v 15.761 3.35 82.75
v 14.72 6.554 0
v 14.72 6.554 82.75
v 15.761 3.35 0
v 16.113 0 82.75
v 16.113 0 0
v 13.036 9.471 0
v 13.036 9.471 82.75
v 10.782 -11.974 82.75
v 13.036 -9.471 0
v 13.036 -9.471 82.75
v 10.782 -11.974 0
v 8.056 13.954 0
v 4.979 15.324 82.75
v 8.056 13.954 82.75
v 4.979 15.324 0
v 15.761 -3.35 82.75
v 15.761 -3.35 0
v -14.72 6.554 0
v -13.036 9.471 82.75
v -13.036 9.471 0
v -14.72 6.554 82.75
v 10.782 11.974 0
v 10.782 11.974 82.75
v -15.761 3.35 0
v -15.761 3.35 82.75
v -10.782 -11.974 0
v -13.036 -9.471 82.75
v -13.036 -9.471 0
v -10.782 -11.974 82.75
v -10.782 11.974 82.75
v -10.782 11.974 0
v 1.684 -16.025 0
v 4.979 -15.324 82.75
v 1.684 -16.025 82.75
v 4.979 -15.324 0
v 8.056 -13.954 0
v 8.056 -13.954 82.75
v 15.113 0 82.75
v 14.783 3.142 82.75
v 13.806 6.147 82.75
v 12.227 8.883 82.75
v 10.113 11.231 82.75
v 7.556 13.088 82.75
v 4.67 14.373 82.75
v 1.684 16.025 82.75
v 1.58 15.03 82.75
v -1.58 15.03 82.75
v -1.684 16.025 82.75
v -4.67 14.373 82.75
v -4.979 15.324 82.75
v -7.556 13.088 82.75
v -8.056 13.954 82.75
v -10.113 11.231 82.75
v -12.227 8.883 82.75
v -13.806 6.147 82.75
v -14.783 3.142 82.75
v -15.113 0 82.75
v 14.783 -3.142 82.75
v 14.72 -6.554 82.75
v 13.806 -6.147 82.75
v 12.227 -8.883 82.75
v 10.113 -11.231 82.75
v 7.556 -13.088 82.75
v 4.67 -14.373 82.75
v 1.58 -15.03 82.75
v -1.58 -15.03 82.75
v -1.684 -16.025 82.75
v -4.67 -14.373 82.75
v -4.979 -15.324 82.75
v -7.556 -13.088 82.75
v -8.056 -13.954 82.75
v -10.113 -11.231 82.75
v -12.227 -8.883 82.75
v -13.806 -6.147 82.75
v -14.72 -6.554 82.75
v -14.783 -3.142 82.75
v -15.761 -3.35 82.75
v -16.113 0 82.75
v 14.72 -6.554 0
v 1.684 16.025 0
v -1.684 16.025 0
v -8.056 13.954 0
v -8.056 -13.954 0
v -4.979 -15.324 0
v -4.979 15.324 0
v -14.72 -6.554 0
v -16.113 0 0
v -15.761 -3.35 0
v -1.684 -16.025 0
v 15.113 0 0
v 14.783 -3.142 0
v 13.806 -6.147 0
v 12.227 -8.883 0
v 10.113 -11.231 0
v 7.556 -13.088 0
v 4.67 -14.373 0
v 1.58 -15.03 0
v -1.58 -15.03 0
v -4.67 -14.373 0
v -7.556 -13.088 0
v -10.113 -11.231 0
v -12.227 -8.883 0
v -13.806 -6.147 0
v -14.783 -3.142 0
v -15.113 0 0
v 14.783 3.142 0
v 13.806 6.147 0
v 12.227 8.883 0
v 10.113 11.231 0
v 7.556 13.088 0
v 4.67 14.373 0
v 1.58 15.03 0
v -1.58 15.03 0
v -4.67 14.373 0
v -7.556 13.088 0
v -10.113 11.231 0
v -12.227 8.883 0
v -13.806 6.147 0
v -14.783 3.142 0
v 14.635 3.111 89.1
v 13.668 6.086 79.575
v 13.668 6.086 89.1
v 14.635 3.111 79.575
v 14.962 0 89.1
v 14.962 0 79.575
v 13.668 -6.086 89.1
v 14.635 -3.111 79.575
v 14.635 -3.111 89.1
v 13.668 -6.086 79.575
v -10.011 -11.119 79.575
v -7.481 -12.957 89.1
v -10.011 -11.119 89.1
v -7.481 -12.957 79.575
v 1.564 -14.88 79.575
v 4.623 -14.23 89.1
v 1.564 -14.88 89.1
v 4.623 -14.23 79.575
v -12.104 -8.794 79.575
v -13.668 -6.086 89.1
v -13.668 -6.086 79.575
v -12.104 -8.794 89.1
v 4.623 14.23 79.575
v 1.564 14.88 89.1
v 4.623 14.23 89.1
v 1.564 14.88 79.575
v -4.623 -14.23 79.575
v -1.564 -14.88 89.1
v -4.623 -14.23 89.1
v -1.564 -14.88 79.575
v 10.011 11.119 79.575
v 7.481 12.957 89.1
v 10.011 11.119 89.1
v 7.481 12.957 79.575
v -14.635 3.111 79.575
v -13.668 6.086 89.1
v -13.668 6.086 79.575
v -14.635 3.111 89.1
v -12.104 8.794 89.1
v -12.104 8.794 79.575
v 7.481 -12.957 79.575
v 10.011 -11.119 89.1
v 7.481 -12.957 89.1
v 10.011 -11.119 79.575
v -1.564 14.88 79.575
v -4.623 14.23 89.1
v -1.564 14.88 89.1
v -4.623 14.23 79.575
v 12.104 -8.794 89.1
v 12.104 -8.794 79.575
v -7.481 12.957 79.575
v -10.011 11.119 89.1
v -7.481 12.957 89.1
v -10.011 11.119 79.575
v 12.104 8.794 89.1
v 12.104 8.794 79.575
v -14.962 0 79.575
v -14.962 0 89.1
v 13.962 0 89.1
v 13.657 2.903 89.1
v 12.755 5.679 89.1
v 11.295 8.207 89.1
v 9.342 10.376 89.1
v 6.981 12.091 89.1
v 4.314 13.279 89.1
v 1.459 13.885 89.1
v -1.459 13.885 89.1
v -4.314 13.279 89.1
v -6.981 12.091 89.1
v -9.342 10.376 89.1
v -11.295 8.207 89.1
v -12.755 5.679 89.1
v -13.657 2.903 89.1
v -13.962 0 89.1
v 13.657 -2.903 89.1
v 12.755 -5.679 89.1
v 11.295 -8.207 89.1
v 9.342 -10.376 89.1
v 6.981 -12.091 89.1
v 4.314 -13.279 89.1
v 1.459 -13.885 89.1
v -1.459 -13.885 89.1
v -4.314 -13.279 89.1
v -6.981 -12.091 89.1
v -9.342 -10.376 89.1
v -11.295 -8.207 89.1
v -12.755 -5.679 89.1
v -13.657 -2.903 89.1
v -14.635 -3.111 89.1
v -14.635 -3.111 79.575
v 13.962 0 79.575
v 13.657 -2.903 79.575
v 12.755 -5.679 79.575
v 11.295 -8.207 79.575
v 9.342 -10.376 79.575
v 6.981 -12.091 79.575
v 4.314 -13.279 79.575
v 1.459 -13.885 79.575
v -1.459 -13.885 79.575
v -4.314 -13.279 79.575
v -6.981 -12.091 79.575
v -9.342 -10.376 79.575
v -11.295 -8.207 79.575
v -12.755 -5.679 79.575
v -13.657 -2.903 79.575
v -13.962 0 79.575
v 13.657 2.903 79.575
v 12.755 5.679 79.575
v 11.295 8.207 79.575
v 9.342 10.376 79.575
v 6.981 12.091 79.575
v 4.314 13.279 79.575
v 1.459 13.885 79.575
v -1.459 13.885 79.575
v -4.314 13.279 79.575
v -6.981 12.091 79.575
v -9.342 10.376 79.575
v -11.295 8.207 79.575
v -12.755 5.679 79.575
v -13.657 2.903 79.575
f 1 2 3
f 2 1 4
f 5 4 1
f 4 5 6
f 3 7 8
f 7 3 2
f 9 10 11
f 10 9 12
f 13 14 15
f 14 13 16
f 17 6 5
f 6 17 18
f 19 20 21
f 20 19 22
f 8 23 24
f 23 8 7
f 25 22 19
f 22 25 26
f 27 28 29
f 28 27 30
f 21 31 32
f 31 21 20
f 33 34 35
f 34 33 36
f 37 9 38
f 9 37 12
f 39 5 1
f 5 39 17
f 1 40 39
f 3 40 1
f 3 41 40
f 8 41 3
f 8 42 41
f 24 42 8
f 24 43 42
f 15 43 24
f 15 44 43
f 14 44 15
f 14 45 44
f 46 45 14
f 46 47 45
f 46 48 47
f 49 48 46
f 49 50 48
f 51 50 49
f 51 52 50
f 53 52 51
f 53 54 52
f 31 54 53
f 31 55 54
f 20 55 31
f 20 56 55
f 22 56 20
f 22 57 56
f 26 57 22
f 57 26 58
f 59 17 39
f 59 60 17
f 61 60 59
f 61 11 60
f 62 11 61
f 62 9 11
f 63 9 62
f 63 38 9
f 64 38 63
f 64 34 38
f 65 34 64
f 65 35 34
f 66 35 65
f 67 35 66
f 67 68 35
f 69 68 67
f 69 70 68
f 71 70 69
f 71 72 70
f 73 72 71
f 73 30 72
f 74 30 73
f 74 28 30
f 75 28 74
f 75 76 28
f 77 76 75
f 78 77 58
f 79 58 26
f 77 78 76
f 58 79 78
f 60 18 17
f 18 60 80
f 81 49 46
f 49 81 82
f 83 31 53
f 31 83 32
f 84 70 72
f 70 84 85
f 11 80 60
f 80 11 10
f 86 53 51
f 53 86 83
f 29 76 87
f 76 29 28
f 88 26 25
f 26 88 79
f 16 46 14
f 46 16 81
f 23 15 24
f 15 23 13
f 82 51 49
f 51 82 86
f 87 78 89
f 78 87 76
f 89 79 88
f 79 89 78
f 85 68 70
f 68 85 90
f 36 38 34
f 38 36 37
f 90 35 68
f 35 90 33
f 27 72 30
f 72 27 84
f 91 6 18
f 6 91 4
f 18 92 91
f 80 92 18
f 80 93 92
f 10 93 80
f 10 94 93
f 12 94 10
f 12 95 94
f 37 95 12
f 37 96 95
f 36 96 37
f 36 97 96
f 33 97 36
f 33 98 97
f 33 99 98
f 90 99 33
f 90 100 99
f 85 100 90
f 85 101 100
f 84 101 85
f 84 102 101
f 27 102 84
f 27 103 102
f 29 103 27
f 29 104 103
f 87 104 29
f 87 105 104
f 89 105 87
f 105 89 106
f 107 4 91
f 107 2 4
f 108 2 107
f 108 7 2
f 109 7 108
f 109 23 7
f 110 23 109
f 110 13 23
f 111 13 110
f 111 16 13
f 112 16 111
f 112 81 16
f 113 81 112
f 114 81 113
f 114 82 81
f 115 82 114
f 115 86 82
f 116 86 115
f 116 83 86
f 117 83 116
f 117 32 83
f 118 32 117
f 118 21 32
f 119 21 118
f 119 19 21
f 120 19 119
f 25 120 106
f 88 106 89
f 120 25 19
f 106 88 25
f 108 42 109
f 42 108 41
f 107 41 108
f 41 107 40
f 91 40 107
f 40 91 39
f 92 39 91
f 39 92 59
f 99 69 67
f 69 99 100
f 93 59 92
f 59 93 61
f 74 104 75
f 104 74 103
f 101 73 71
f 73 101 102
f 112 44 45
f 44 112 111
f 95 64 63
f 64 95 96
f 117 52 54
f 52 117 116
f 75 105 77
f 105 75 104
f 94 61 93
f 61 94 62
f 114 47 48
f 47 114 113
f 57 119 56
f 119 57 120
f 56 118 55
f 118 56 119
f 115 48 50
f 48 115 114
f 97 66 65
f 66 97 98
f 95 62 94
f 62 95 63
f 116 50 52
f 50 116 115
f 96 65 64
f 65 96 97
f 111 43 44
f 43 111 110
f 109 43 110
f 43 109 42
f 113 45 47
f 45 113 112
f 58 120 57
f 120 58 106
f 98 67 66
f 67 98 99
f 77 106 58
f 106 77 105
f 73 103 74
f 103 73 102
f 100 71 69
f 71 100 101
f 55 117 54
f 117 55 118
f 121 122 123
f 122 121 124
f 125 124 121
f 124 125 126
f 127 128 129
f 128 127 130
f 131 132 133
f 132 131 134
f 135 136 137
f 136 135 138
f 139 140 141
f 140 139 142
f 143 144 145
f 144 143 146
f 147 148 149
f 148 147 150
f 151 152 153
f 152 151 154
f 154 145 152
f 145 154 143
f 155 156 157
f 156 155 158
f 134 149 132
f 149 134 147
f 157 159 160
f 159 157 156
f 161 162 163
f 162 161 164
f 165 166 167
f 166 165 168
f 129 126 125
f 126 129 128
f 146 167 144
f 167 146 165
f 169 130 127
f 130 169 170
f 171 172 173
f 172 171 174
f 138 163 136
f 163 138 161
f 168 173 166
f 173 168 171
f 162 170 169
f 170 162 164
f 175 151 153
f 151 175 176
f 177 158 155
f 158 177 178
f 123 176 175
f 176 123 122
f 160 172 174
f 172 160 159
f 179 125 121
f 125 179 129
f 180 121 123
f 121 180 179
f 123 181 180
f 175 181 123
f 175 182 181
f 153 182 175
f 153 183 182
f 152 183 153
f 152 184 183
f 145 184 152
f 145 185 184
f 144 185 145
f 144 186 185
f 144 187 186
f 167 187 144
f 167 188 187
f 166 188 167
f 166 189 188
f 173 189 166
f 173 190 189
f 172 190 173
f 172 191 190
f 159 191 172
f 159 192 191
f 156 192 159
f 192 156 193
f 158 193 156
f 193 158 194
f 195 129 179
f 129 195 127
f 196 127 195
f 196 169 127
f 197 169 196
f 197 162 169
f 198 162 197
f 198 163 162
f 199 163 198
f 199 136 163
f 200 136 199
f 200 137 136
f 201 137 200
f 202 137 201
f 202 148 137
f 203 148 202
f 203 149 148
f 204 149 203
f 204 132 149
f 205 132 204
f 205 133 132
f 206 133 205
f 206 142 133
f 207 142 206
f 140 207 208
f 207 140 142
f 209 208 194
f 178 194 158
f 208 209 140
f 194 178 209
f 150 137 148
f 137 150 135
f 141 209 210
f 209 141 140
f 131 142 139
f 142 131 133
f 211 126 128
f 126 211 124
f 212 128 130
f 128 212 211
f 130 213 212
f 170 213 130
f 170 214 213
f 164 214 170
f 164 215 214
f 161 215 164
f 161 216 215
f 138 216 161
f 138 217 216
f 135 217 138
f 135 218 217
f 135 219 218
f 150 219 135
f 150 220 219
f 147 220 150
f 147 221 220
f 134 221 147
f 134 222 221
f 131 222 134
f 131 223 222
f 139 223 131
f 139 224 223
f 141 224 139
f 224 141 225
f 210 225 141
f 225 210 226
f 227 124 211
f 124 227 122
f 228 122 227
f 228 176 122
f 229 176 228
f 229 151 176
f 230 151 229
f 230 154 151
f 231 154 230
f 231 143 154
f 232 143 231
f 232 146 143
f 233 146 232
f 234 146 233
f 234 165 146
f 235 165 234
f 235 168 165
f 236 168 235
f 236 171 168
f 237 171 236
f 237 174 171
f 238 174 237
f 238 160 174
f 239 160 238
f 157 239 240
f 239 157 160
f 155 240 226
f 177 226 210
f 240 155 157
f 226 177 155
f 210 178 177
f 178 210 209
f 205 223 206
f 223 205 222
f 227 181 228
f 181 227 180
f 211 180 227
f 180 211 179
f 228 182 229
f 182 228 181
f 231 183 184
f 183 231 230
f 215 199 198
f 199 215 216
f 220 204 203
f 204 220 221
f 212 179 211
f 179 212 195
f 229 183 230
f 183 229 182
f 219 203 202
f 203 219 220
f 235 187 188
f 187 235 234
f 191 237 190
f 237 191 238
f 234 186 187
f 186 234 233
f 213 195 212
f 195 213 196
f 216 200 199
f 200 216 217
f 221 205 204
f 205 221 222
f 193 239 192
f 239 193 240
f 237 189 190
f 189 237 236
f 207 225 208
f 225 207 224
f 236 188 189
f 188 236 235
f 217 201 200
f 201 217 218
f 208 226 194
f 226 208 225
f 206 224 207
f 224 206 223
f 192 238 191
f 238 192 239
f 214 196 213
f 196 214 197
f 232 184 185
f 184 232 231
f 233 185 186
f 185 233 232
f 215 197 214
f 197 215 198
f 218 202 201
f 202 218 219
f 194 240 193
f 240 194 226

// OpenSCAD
// file: rockit.scad
// Rockit - Model Rocket Construction Kit
//
// Giles Hall (C) 2012,2013
//
// Tail fin code based on:
// - Lutz Paelke (lpaelke) - http://www.thingiverse.com/thing:26508/

function in2mm(in) = in / 0.0393701;

/////////////////
// Engine Dimensions
// http://www2.estesrockets.com/pdf/Estes_Model_Rocket_Engines.pdf
// mini engine
mini_engine_pad = 0.2;
mini_engine_gap = in2mm(.5);
mini_engine_length = in2mm(1.75);
mini_engine_dia = in2mm(.5);
// standard engine
standard_engine_pad = 0.2;
standard_engine_gap = in2mm(.5);
standard_engine_length = in2mm(2.75);
standard_engine_dia = in2mm(.69);
// D engine
d_engine_pad = 0.2;
d_engine_gap = in2mm(1);
d_engine_length = in2mm(2.75);
d_engine_dia = in2mm(.95);
// E engine
e_engine_pad = 0.2;
e_engine_gap = in2mm(.5);
e_engine_length = in2mm(3.75);
e_engine_dia = in2mm(.95);
// engine selection
engine_length = standard_engine_length;
engine_dia = standard_engine_dia;
engine_gap = standard_engine_gap;
engine_pad = standard_engine_pad;

/////////////////
// Global
wall_thickness = 2;
collar_height = in2mm(.25);

/////////////////
// Engine Holder
engine_holder_enabled = 1;
engine_holder_overhang = 20;
engine_holder_inner_dia = engine_dia + engine_pad;
engine_holder_outer_dia = engine_dia + wall_thickness;
engine_holder_length = engine_length + engine_pad;
engine_holder_offset = collar_height;
engine_holder_firewall_length = in2mm(.25);

/////////////////
// Body
body_enabled = 1;
//body_height = engine_holder_length + engine_holder_offset + engine_holder_offset + in2mm(.2);
body_height = engine_holder_length + engine_holder_offset + engine_holder_offset;
body_inner_dia = engine_dia + engine_gap;
body_outer_dia = body_inner_dia + wall_thickness;

/////////////////
// Fins
fins_enabled = 1;
fin_count = 6;
fin_span = body_outer_dia * 3.5;
fin_thickness = wall_thickness;
fin_endchord = body_height * .6;
fin_sym_flag = 1;
//fin_offset = fin_endchord;
fin_offset = 0;
fin_coverage = .99;
fin_height = (body_height - fin_offset) * fin_coverage;

/////////////////
// Collar
collar_enabled = 1;
collar_overlap = collar_height * .5;
collar_fit = .990;
collar_outer_dia = body_inner_dia * collar_fit;
collar_inner_dia = collar_outer_dia - wall_thickness;

/////////////////
// Guide
guide_enabled = 1;
guide_inner_dia = 4.6;
guide_outer_dia = guide_inner_dia + 1;
guide_height = in2mm(2);
guide_offset = in2mm(.5);

/////////////////
// Quality
circle_segments = 30;

module fin(angle, deflection)
{
    translate([0,0,fin_offset])
    rotate([0,0,angle])
        polyhedron(points=[
        // inner-bottom
        [body_inner_dia / 2, fin_thickness / 2 + deflection, 0], 
        [body_inner_dia / 2, -fin_thickness / 2 + deflection, 0],
        // outer-bottom
        [fin_span / 2, fin_thickness / 2 + deflection, fin_sym_flag ? -fin_endchord : 0], 
        [fin_span / 2, -fin_thickness / 2 + deflection, fin_sym_flag ? -fin_endchord : 0],
        // outer-top
        [fin_span / 2, fin_thickness / 2 - deflection, fin_height - fin_endchord], 
        [fin_span / 2, -fin_thickness / 2 - deflection, fin_height - fin_endchord],
        // inner-top
        [body_inner_dia / 2, fin_thickness / 2 - deflection, fin_height],
        [body_inner_dia / 2, -fin_thickness / 2 - deflection, fin_height]],
        triangles=[[0, 1, 2],  [1, 3, 2], 
                    [2, 3, 4],  [3, 5, 4], 
                    [4, 5, 6],  [5, 7, 6], 
                    [6, 7, 0],  [7, 1, 0], 
                    [0, 2, 6],  [2, 4, 6], 
                    [1, 7, 3],  [3, 7, 5]]);
}

module tube(name, length, outer_dia, inner_dia)
{
    echo(str("Tube [", name, "]: ", length, "mm len, ", outer_dia, "mm OD, ", inner_dia, "mm ID"));
    difference()
    {
        // outer
        cylinder(h=length, r=outer_dia / 2, $fn=circle_segments);
        // inner
        cylinder(h=length, r=inner_dia / 2, $fn=circle_segments);
    }
}

module tube2(name, length, outer_dia1, inner_dia1, outer_dia2, inner_dia2)
{
    echo(str("Tube2 [", name, "]: ", length, "mm len, ", outer_dia, "mm OD, ", inner_dia, "mm ID"));
    difference()
    {
        // outer
        cylinder(h=length, r1=outer_dia1 / 2, r2=outer_dia2 / 2, $fn=circle_segments);
        // inner
        cylinder(h=length, r1=inner_dia1 / 2, r2=inner_dia2 / 2, $fn=circle_segments);
    }
}

module make_guide() 
{
    if (guide_enabled)
    {
		rotate([0, 0, 180 / fin_count]) 
        translate([body_outer_dia / 2 + guide_inner_dia / 2, 0, guide_offset])
        tube("guide", guide_height, guide_outer_dia, guide_inner_dia);
    }
}

module make_fins() 
{
    if (fins_enabled)
    {
		for (i = [0:fin_count - 1])
        {
            fin(i * (360 / fin_count), 0);
        }
    }
}

module make_collar()
{
    if (collar_enabled)
    {
        translate([0, 0, body_height - collar_overlap]) 
        tube("collar", collar_height + collar_overlap, collar_outer_dia, collar_inner_dia);
    }
}

module make_engine_holder()
{
    if (engine_holder_enabled)
    {
        union()
        {
            // engine offset
            translate([0, 0, engine_holder_offset * 2])
            tube("engine tube", engine_holder_length, engine_holder_outer_dia, engine_holder_inner_dia);
            // engine collar
            translate([0, 0, engine_holder_offset])
            tube2("engine tube", engine_holder_offset, body_outer_dia, body_inner_dia, engine_holder_outer_dia, engine_holder_inner_dia);
            // engine firewall
            translate([0, 0, engine_holder_offset + engine_holder_length])
            tube("engine firewall", engine_holder_firewall_length, body_outer_dia, engine_holder_inner_dia);
        }
    }
}

module make_body()
{
    if (body_enabled)
    {
        tube("body", body_height, body_outer_dia, body_inner_dia);
    }
}

module make_rocket()
{
    union()
    {
        // outer
        make_body();
        make_collar();
        make_guide();
        make_fins();
        make_engine_holder();
    }
}
// main file
include <rockit.scad>;
fins_enabled = 0;
engine_holder_enabled = 0;
guide_enabled = 0;
make_rocket();
